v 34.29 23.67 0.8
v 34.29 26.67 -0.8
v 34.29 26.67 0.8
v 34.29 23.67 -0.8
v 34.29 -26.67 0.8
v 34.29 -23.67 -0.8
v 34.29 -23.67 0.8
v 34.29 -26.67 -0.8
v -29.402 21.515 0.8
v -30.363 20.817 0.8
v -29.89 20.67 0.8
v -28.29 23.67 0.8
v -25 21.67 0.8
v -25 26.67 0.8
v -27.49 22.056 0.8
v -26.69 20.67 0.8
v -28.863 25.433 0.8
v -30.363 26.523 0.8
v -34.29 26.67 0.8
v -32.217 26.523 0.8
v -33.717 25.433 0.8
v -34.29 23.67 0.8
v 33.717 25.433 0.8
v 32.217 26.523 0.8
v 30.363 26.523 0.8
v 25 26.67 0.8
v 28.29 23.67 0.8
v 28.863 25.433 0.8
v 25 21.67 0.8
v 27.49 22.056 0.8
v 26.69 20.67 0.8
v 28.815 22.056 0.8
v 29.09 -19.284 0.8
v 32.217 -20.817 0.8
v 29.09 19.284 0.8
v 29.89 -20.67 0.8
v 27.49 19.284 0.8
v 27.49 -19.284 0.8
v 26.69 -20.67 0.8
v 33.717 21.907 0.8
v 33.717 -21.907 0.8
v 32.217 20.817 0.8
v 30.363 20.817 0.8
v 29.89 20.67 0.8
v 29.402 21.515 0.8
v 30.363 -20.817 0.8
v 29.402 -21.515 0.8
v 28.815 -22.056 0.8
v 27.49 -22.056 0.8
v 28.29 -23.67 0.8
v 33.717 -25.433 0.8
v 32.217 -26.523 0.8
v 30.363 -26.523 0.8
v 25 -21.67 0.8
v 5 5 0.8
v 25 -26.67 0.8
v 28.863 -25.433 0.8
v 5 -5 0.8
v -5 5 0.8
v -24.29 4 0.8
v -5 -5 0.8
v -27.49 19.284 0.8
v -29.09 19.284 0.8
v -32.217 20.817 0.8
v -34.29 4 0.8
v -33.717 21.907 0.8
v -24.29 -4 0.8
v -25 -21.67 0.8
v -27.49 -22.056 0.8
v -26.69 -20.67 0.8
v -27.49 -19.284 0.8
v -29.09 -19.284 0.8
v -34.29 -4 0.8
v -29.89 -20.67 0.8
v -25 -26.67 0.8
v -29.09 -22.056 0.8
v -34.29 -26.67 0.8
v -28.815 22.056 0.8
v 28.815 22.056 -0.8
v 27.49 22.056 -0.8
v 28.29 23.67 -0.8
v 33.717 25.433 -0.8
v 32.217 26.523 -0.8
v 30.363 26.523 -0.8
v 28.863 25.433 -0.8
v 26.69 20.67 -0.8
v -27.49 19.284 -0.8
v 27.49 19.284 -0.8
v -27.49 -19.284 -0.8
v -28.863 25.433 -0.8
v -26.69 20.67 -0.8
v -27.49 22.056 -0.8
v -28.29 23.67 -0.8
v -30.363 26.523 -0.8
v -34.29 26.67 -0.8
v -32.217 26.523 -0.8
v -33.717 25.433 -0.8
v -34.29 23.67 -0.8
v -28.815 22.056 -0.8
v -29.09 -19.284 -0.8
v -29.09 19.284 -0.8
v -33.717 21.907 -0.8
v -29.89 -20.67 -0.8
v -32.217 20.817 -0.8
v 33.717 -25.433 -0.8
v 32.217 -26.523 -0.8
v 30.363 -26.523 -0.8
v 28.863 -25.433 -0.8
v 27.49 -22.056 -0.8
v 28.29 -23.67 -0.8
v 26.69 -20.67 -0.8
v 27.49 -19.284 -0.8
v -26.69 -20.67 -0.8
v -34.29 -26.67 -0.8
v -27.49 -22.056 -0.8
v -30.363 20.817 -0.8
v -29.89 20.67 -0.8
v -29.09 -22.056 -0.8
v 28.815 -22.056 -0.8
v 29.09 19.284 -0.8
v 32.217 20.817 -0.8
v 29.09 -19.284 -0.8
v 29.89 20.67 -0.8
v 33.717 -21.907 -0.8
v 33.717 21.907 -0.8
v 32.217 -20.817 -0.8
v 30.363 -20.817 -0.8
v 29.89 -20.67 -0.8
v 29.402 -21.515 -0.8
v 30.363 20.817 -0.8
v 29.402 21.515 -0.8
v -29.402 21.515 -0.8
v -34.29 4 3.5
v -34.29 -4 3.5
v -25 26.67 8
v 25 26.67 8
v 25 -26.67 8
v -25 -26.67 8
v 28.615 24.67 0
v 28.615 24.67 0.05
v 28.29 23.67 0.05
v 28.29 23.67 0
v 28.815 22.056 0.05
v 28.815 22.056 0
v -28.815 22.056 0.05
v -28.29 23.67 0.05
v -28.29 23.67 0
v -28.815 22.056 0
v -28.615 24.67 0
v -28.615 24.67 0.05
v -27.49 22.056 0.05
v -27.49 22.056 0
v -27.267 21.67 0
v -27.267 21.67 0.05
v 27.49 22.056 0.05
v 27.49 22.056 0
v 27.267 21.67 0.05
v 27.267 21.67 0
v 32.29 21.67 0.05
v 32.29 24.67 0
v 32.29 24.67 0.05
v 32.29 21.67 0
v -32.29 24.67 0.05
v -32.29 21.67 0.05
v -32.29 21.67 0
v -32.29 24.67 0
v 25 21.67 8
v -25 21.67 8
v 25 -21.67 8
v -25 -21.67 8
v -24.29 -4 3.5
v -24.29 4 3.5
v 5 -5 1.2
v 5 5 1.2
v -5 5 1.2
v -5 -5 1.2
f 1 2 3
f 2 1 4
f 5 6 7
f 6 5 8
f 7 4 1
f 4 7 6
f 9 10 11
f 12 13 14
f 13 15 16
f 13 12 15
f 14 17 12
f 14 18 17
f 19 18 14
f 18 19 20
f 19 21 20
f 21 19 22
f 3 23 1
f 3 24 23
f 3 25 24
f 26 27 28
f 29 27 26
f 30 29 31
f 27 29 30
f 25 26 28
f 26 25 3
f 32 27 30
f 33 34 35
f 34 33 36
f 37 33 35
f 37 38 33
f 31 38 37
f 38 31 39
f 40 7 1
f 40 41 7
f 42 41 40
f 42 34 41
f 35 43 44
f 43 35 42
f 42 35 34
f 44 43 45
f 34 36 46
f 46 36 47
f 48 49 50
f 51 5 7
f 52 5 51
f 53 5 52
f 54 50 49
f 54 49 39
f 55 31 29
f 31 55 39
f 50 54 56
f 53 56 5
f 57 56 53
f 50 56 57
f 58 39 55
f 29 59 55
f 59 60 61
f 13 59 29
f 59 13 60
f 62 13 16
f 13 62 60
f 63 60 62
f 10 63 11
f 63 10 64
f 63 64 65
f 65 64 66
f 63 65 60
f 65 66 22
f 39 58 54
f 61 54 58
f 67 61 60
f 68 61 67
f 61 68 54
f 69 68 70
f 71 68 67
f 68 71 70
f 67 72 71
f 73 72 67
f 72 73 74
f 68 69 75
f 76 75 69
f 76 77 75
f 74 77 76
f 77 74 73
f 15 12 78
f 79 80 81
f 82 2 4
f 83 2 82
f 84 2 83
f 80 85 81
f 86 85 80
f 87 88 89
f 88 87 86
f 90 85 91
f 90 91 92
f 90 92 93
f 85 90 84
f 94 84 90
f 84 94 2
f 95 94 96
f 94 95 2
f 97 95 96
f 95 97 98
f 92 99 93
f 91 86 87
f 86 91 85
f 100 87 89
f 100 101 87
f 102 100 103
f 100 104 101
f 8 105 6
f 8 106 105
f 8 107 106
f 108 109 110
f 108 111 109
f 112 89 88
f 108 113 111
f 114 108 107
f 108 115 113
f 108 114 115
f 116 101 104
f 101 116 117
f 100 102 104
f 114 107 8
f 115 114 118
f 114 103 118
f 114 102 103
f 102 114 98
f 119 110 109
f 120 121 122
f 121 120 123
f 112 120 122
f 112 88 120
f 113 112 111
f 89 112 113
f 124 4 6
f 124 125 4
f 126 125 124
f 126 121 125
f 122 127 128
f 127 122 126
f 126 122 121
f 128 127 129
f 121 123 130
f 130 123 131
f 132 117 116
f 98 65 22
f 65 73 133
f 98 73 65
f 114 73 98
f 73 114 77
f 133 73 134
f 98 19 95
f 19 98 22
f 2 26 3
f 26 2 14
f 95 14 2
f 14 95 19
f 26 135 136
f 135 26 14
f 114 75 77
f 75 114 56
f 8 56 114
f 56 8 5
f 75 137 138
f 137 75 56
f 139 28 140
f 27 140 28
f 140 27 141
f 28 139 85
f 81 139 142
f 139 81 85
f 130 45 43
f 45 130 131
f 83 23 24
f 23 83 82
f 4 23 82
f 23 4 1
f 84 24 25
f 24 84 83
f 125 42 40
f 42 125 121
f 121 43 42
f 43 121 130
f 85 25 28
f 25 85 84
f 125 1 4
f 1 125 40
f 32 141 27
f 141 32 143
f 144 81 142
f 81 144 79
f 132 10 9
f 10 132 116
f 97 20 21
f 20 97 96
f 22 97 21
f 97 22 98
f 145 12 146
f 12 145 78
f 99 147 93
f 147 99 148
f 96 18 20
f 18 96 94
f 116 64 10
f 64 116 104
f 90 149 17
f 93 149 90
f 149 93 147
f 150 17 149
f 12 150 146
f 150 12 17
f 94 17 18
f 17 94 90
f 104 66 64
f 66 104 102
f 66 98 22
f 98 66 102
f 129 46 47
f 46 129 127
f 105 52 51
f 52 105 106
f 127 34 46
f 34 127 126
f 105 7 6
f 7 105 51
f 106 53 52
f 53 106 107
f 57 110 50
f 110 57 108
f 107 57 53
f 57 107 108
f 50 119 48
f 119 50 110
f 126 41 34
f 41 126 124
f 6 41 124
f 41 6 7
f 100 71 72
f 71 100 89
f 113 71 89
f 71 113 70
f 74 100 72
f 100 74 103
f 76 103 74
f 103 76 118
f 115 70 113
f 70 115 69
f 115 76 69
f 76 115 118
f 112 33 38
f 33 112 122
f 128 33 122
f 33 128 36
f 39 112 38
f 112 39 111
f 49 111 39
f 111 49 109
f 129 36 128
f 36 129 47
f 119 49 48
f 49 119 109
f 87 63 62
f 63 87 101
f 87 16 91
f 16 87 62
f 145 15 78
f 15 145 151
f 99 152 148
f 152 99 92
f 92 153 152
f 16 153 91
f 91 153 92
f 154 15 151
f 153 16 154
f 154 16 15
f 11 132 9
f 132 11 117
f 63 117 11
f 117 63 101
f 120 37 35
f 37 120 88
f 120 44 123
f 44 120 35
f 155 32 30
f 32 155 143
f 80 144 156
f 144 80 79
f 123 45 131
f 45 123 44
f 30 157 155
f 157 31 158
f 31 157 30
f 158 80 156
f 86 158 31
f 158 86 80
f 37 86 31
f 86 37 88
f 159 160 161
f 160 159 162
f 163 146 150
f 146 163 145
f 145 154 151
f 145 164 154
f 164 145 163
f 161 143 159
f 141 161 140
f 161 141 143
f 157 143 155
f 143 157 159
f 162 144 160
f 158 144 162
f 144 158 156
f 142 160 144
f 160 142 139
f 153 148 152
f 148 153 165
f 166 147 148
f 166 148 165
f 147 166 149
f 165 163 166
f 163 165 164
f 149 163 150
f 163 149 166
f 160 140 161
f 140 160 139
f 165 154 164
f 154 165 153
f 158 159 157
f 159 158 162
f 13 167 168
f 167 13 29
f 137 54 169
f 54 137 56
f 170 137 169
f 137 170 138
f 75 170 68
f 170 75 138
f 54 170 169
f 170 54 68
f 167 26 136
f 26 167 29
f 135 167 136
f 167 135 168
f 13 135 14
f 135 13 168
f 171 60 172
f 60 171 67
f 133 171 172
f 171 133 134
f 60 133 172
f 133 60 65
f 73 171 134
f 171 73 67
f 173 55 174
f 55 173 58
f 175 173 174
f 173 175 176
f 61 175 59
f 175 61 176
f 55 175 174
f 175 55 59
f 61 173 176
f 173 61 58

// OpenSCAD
// Parameters
pcb_length = 68.58; //[34.29:137.16:0.01]
pcb_width = 53.34; //[26.67:106.68:0.01]
pcb_thickness = 1.6; //[0.8:3.2:0.05]
corner_radius = 3.0; //[1.5:6.0:0.1]
hole_diameter = 3.2; //[2.0:6.0:0.1]
hole_edge_margin = 6.0; //[3.0:12.0:0.1]
hole_clearance_extra = 0.4; //[0.1:1.0:0.05]
silkscreen_thickness = 0.05; //[0.02:0.2:0.01]
silkscreen_margin = 2.0; //[0.5:6.0:0.1]
silkscreen_stripe_width = 3.0; //[1.0:10.0:0.1]
header_length = 50.0; //[25.0:100.0:0.5]
header_width = 5.0; //[3.0:10.0:0.1]
header_height = 8.0; //[4.0:16.0:0.5]
usb_width = 8.0; //[5.0:16.0:0.1]
usb_length = 10.0; //[6.0:20.0:0.1]
usb_height = 3.5; //[2.0:8.0:0.1]
ic_length = 10.0; //[5.0:25.0:0.1]
ic_width = 10.0; //[5.0:25.0:0.1]
ic_height = 1.2; //[0.6:3.0:0.05]
connect_overlap = 0.8; //[0.5:2.0:0.1]

// Main PCB Body
module pcb_main_body() {
  color([0.0, 0.4, 0.2]) // Green PCB
  cube([pcb_length, pcb_width, pcb_thickness], center=true);
}

// Edge Rounding Corner Cutter
module edge_rounding_corner_cutter() {
  translate([pcb_length/2 - corner_radius, pcb_width/2 - corner_radius, 0])
    cylinder(r=corner_radius, h=pcb_thickness + hole_clearance_extra, center=true);
}

// Mounting Hole Cutter
module mounting_hole_cutter(x, y) {
  translate([x, y, 0])
    cylinder(r=hole_diameter/2, h=pcb_thickness + hole_clearance_extra, center=true);
}

// Silkscreen Markings
module silkscreen_markings() {
  color("White")
  translate([0, pcb_width/2 - silkscreen_margin - silkscreen_stripe_width/2, pcb_thickness/2 + silkscreen_thickness/2 - connect_overlap])
    cube([pcb_length - 2*silkscreen_margin, silkscreen_stripe_width, silkscreen_thickness], center=true);
}

// Connectors Headers
module connectors_headers_left() {
  color("Black")
  translate([0, -pcb_width/2 + header_width/2, pcb_thickness/2 + header_height/2 - connect_overlap])
    cube([header_length, header_width, header_height], center=true);
}

module connectors_headers_right() {
  color("Black")
  translate([0, pcb_width/2 - header_width/2, pcb_thickness/2 + header_height/2 - connect_overlap])
    cube([header_length, header_width, header_height], center=true);
}

// USB Connector
module usb_connector() {
  color("Silver")
  translate([-pcb_length/2 + usb_length/2, 0, pcb_thickness/2 + usb_height/2 - connect_overlap])
    cube([usb_length, usb_width, usb_height], center=true);
}

// IC Packages
module ic_packages() {
  color("DimGray")
  translate([0, 0, pcb_thickness/2 + ic_height/2 - connect_overlap])
    cube([ic_length, ic_width, ic_height], center=true);
}

// Complete Model
module complete_model() {
  difference() {
    pcb_main_body();
    edge_rounding_corner_cutter();
    mirror([1, 0, 0]) edge_rounding_corner_cutter();
    mirror([0, 1, 0]) edge_rounding_corner_cutter();
    mirror([1, 1, 0]) edge_rounding_corner_cutter();
    mounting_hole_cutter(-pcb_length/2 + hole_edge_margin, -pcb_width/2 + hole_edge_margin);
    mounting_hole_cutter(pcb_length/2 - hole_edge_margin, -pcb_width/2 + hole_edge_margin);
    mounting_hole_cutter(-pcb_length/2 + hole_edge_margin, pcb_width/2 - hole_edge_margin);
    mounting_hole_cutter(pcb_length/2 - hole_edge_margin, pcb_width/2 - hole_edge_margin);
  }
  union() {
    silkscreen_markings();
    connectors_headers_left();
    connectors_headers_right();
    usb_connector();
    ic_packages();
  }
}

// Render the complete model
complete_model();
